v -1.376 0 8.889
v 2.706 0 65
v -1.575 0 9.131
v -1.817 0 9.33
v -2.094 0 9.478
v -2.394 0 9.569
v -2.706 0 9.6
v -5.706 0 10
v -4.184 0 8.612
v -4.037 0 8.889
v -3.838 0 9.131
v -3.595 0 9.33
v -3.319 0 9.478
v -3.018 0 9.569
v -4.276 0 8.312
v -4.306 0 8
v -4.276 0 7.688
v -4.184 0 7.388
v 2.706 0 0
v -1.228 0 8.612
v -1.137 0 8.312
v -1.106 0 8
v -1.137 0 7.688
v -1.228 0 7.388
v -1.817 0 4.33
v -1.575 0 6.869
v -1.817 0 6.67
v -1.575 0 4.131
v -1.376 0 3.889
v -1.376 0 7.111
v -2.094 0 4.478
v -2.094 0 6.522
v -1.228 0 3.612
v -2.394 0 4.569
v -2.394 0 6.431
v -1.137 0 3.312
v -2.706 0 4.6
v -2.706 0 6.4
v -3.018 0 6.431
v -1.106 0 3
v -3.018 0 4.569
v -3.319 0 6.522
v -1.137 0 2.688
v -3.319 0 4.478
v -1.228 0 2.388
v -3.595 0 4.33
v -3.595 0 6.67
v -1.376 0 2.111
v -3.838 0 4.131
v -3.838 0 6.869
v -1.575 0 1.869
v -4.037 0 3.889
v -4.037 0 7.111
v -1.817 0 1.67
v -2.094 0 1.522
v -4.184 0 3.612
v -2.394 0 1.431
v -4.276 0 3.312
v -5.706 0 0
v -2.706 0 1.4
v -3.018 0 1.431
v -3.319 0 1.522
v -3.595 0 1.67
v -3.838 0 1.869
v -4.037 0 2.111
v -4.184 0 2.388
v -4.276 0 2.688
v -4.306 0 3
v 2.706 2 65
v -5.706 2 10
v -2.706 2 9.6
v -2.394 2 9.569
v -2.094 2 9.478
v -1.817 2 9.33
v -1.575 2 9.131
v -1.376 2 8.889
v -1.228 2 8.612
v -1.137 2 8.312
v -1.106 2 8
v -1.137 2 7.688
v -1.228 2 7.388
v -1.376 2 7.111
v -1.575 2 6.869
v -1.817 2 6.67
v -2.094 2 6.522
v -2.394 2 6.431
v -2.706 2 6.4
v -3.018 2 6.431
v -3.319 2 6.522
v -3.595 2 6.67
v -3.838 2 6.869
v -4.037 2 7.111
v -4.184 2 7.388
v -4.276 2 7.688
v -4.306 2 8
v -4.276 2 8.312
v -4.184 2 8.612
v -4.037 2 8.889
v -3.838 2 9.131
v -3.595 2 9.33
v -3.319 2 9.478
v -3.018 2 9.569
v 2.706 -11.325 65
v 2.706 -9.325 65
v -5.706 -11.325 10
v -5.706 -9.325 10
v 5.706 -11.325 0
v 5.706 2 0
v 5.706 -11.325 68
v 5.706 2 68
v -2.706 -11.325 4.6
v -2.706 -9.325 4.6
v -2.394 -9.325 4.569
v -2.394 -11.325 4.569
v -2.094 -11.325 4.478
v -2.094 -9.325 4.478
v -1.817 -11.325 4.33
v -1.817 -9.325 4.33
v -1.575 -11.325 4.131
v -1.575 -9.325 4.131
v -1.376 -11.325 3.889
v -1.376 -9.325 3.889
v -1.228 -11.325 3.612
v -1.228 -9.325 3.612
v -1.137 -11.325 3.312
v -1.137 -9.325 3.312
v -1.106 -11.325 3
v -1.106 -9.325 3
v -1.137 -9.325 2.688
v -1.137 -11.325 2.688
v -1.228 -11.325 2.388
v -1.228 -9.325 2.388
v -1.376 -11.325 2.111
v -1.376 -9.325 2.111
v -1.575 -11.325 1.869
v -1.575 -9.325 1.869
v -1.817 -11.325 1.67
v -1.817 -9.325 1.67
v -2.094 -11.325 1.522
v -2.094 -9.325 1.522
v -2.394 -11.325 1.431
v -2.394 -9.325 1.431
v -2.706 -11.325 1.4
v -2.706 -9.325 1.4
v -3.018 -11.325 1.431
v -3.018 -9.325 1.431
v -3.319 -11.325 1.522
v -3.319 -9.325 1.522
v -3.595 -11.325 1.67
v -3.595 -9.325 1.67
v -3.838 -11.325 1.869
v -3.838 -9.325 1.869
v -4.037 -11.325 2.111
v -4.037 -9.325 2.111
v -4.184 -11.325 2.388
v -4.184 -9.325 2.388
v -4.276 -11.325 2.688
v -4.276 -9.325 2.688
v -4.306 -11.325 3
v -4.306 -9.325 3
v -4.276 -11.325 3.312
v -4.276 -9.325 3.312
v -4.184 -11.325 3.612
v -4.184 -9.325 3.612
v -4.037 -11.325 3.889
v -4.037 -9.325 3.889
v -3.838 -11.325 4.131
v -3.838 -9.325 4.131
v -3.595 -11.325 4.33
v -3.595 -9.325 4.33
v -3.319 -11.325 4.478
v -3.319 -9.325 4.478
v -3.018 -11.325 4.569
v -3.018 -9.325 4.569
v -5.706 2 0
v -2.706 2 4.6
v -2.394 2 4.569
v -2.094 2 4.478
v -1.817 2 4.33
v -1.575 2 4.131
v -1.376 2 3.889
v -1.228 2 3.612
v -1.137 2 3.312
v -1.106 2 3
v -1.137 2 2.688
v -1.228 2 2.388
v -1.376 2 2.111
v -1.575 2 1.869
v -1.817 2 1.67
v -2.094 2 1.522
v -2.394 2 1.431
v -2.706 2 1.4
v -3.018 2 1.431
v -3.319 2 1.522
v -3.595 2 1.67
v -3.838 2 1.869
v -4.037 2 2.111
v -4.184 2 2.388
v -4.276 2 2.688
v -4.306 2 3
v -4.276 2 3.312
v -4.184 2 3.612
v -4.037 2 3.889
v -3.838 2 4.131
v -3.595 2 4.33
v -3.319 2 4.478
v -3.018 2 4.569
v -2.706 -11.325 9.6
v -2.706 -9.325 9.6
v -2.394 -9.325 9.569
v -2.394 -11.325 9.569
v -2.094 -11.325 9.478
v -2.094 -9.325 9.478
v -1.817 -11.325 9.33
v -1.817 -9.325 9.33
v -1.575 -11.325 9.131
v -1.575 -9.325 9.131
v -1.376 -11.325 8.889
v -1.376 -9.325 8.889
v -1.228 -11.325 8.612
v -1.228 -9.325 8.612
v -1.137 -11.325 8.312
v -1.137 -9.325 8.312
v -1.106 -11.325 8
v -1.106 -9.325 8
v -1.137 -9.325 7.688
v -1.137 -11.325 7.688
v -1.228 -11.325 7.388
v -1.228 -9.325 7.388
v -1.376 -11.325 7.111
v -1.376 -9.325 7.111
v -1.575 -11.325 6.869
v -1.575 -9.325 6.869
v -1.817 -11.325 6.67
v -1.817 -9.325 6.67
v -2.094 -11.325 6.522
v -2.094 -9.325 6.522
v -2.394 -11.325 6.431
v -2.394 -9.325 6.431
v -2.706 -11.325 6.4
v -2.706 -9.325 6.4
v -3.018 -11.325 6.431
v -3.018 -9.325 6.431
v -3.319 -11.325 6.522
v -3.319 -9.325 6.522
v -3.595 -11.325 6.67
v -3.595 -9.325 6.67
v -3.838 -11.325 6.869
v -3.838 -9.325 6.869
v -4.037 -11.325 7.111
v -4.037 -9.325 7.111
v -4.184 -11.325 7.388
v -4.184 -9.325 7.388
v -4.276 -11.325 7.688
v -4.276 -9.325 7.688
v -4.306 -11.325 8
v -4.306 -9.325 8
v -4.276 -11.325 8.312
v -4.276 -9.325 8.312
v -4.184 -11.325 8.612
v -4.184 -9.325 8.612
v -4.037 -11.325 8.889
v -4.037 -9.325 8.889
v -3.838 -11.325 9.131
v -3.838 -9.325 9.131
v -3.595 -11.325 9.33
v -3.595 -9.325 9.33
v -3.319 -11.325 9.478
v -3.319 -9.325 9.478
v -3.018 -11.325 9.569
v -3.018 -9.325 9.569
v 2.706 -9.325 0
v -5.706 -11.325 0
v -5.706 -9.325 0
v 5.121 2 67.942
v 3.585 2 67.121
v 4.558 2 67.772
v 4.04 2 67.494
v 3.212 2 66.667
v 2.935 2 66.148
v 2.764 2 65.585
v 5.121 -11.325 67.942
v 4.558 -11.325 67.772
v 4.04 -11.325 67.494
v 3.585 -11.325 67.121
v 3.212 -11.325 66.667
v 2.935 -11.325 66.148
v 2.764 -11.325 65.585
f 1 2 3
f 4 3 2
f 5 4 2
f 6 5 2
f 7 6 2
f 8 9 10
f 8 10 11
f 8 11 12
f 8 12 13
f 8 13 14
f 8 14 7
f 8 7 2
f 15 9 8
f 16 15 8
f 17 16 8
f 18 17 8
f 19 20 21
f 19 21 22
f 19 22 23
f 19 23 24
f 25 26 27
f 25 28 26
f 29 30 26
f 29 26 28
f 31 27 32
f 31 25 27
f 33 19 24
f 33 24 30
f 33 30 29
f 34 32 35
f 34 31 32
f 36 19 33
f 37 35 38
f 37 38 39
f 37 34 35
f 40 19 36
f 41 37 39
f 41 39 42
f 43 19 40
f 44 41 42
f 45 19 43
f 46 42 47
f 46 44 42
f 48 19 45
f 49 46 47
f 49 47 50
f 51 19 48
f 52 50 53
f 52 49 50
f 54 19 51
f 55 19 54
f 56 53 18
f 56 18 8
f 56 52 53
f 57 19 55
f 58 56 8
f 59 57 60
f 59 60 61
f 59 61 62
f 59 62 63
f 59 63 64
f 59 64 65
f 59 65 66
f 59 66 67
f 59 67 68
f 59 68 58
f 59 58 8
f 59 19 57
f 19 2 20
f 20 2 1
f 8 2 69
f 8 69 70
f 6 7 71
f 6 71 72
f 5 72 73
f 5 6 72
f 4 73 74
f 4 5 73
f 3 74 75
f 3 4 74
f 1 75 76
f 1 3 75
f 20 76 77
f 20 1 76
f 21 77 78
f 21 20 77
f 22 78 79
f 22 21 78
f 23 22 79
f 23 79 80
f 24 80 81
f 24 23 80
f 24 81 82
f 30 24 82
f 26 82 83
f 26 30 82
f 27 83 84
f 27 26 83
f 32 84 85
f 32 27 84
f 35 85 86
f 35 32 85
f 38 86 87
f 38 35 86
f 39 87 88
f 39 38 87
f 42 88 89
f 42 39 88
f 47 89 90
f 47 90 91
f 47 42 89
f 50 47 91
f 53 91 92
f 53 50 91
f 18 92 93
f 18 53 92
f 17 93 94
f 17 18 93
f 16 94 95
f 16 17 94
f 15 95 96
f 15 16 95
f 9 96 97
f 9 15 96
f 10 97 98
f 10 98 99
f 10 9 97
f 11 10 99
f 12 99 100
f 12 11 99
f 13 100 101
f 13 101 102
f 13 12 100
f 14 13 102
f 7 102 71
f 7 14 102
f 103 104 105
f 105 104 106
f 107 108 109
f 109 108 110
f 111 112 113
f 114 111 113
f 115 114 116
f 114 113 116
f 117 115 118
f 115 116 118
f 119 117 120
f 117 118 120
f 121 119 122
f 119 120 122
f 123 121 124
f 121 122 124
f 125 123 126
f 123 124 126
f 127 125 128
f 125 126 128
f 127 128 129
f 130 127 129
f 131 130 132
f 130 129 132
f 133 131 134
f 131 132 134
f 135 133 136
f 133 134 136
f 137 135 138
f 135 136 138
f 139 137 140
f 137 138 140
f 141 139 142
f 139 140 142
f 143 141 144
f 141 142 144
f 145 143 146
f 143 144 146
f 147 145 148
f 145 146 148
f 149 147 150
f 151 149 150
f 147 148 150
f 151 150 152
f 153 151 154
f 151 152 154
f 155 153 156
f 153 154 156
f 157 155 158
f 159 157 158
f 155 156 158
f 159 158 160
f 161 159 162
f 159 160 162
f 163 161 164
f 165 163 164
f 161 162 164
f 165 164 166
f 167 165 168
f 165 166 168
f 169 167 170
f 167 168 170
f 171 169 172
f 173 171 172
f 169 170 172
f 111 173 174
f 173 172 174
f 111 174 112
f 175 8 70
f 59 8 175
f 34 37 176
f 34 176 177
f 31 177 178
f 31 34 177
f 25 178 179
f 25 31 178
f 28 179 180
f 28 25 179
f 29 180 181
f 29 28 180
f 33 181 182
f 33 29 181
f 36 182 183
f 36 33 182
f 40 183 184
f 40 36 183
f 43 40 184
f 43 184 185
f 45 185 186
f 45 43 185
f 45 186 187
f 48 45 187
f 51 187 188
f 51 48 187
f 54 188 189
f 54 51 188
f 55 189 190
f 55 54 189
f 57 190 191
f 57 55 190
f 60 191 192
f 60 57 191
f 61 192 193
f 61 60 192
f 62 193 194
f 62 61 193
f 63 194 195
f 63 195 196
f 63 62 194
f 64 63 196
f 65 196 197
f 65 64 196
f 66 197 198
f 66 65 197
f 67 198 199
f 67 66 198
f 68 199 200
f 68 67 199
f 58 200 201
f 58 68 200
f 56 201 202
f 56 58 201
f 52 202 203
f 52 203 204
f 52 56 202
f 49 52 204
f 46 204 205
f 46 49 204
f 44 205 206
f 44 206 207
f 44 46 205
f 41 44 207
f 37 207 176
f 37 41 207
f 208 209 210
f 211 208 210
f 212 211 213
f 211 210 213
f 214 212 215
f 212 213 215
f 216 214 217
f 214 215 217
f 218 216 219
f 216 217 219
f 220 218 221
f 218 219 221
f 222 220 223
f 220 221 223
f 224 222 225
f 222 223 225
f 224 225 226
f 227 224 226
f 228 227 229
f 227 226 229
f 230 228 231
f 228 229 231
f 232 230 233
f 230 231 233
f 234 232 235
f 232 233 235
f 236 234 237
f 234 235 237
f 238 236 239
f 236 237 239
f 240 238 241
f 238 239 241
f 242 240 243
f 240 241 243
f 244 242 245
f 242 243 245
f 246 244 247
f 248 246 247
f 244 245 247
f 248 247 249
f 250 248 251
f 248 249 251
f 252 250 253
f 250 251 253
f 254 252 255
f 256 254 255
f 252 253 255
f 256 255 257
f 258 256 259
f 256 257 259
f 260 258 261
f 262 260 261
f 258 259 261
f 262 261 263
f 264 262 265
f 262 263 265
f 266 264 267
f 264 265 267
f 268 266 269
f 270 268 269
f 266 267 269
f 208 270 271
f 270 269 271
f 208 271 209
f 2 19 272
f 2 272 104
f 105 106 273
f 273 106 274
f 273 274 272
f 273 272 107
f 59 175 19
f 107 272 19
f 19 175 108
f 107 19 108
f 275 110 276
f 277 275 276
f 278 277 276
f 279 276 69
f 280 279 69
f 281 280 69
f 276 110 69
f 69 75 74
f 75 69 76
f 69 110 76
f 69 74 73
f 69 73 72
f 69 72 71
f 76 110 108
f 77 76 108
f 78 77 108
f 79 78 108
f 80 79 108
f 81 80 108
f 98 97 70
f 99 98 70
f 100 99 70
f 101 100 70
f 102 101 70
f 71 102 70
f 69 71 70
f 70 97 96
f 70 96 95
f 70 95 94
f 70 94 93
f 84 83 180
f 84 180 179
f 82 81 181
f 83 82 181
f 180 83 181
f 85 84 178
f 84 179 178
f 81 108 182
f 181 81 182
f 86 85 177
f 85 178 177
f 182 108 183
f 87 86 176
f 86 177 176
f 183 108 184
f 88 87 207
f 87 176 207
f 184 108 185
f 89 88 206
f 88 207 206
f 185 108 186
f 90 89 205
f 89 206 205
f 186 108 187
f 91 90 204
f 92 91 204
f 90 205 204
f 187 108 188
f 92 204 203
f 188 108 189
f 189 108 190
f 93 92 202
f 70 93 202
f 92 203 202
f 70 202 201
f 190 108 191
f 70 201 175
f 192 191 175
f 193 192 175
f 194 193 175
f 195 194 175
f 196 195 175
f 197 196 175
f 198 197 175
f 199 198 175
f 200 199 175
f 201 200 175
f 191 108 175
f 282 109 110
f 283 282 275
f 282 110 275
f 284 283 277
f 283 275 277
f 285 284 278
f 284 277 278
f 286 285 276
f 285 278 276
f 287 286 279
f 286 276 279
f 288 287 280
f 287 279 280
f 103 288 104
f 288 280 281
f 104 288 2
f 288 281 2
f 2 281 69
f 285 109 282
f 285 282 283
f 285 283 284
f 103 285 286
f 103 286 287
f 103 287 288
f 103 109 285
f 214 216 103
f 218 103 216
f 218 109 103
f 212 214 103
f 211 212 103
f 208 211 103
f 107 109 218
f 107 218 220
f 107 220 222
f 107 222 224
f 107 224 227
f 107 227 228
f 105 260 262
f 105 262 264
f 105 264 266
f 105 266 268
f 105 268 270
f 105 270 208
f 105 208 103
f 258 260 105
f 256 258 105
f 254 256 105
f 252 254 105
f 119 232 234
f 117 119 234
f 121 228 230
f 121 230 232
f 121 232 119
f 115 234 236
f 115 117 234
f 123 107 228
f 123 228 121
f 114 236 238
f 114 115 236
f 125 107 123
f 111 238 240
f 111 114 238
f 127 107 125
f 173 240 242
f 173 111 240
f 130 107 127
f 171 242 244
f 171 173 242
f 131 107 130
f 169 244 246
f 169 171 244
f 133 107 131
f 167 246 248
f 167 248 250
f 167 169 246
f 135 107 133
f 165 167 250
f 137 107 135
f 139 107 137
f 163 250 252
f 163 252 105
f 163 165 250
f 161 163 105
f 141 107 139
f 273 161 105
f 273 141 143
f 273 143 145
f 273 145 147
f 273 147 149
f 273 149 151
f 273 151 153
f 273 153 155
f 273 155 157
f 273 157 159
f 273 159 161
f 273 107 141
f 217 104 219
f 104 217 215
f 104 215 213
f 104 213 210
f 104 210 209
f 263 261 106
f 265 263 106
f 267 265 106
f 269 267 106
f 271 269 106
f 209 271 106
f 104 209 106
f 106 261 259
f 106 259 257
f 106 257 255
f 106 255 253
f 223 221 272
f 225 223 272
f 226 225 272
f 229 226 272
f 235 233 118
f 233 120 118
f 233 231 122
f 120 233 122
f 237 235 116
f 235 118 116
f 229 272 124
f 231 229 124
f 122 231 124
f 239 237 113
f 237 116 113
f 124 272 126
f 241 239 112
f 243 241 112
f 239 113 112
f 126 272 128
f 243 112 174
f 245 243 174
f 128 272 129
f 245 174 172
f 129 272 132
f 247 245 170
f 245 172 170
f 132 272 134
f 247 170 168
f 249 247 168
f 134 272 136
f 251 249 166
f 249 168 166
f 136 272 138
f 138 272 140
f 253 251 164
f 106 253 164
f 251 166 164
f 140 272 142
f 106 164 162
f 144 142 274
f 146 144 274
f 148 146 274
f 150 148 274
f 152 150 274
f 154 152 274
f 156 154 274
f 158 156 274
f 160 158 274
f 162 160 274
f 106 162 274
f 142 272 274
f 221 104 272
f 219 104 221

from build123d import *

# Parameters (mm, degrees)
SKETCH1_R           = 1.6
BOSS_EXTRUDE1_DEPTH = 2
BOSS_EXTRUDE2_START = 4.6625
BOSS_EXTRUDE2_DEPTH = 4.6625


with BuildPart() as part:
    # Sketch1 → Boss-Extrude1 (new body)
    with BuildSketch(Plane(origin=(0, 0, 0), x_dir=(1, 0, 0), z_dir=(0, 1, 0))):
        with BuildLine():
            Line((-5.70625, 0), (5.70625, 0))
            Line((5.70625, 0), (5.70625, -68))
            ThreePointArc((5.70625, -68), (3.584929656, -67.121320344), (2.70625, -65))
            Line((2.70625, -65), (-5.70625, -10))
            Line((-5.70625, -10), (-5.70625, 0))
        make_face()
        with Locations(Location((-2.70625, -3, 0), (0, 0, 270))):
            Circle(SKETCH1_R, mode=Mode.SUBTRACT)
        with Locations(Location((-2.70625, -8, 0), (0, 0, 270))):
            Circle(SKETCH1_R, mode=Mode.SUBTRACT)
    boss_extrude1 = extrude(amount=BOSS_EXTRUDE1_DEPTH)

    # Sketch2 → Boss-Extrude2 (add)
    with BuildSketch(Plane.XZ.offset(BOSS_EXTRUDE2_START)):
        with BuildLine():
            Line((5.70625, 68), (5.70625, 0))
            Line((5.70625, 0), (2.70625, 0))
            Line((2.70625, 0), (2.70625, 65))
            ThreePointArc((2.70625, 65), (3.584929656, 67.121320344), (5.70625, 68))
        make_face()
    boss_extrude2 = extrude(amount=-BOSS_EXTRUDE2_DEPTH)

    # Mirror6: Boss-Extrude2 across plane
    add(boss_extrude2.mirror(Plane(origin=(0, -4.6625, 0), x_dir=(0, 0, 1), z_dir=(0, -1, 0))))

    # Mirror7: Boss-Extrude1 across plane
    add(boss_extrude1.mirror(Plane(origin=(0, -4.6625, 0), x_dir=(0, 0, 1), z_dir=(0, -1, 0))))


solid = part.part
